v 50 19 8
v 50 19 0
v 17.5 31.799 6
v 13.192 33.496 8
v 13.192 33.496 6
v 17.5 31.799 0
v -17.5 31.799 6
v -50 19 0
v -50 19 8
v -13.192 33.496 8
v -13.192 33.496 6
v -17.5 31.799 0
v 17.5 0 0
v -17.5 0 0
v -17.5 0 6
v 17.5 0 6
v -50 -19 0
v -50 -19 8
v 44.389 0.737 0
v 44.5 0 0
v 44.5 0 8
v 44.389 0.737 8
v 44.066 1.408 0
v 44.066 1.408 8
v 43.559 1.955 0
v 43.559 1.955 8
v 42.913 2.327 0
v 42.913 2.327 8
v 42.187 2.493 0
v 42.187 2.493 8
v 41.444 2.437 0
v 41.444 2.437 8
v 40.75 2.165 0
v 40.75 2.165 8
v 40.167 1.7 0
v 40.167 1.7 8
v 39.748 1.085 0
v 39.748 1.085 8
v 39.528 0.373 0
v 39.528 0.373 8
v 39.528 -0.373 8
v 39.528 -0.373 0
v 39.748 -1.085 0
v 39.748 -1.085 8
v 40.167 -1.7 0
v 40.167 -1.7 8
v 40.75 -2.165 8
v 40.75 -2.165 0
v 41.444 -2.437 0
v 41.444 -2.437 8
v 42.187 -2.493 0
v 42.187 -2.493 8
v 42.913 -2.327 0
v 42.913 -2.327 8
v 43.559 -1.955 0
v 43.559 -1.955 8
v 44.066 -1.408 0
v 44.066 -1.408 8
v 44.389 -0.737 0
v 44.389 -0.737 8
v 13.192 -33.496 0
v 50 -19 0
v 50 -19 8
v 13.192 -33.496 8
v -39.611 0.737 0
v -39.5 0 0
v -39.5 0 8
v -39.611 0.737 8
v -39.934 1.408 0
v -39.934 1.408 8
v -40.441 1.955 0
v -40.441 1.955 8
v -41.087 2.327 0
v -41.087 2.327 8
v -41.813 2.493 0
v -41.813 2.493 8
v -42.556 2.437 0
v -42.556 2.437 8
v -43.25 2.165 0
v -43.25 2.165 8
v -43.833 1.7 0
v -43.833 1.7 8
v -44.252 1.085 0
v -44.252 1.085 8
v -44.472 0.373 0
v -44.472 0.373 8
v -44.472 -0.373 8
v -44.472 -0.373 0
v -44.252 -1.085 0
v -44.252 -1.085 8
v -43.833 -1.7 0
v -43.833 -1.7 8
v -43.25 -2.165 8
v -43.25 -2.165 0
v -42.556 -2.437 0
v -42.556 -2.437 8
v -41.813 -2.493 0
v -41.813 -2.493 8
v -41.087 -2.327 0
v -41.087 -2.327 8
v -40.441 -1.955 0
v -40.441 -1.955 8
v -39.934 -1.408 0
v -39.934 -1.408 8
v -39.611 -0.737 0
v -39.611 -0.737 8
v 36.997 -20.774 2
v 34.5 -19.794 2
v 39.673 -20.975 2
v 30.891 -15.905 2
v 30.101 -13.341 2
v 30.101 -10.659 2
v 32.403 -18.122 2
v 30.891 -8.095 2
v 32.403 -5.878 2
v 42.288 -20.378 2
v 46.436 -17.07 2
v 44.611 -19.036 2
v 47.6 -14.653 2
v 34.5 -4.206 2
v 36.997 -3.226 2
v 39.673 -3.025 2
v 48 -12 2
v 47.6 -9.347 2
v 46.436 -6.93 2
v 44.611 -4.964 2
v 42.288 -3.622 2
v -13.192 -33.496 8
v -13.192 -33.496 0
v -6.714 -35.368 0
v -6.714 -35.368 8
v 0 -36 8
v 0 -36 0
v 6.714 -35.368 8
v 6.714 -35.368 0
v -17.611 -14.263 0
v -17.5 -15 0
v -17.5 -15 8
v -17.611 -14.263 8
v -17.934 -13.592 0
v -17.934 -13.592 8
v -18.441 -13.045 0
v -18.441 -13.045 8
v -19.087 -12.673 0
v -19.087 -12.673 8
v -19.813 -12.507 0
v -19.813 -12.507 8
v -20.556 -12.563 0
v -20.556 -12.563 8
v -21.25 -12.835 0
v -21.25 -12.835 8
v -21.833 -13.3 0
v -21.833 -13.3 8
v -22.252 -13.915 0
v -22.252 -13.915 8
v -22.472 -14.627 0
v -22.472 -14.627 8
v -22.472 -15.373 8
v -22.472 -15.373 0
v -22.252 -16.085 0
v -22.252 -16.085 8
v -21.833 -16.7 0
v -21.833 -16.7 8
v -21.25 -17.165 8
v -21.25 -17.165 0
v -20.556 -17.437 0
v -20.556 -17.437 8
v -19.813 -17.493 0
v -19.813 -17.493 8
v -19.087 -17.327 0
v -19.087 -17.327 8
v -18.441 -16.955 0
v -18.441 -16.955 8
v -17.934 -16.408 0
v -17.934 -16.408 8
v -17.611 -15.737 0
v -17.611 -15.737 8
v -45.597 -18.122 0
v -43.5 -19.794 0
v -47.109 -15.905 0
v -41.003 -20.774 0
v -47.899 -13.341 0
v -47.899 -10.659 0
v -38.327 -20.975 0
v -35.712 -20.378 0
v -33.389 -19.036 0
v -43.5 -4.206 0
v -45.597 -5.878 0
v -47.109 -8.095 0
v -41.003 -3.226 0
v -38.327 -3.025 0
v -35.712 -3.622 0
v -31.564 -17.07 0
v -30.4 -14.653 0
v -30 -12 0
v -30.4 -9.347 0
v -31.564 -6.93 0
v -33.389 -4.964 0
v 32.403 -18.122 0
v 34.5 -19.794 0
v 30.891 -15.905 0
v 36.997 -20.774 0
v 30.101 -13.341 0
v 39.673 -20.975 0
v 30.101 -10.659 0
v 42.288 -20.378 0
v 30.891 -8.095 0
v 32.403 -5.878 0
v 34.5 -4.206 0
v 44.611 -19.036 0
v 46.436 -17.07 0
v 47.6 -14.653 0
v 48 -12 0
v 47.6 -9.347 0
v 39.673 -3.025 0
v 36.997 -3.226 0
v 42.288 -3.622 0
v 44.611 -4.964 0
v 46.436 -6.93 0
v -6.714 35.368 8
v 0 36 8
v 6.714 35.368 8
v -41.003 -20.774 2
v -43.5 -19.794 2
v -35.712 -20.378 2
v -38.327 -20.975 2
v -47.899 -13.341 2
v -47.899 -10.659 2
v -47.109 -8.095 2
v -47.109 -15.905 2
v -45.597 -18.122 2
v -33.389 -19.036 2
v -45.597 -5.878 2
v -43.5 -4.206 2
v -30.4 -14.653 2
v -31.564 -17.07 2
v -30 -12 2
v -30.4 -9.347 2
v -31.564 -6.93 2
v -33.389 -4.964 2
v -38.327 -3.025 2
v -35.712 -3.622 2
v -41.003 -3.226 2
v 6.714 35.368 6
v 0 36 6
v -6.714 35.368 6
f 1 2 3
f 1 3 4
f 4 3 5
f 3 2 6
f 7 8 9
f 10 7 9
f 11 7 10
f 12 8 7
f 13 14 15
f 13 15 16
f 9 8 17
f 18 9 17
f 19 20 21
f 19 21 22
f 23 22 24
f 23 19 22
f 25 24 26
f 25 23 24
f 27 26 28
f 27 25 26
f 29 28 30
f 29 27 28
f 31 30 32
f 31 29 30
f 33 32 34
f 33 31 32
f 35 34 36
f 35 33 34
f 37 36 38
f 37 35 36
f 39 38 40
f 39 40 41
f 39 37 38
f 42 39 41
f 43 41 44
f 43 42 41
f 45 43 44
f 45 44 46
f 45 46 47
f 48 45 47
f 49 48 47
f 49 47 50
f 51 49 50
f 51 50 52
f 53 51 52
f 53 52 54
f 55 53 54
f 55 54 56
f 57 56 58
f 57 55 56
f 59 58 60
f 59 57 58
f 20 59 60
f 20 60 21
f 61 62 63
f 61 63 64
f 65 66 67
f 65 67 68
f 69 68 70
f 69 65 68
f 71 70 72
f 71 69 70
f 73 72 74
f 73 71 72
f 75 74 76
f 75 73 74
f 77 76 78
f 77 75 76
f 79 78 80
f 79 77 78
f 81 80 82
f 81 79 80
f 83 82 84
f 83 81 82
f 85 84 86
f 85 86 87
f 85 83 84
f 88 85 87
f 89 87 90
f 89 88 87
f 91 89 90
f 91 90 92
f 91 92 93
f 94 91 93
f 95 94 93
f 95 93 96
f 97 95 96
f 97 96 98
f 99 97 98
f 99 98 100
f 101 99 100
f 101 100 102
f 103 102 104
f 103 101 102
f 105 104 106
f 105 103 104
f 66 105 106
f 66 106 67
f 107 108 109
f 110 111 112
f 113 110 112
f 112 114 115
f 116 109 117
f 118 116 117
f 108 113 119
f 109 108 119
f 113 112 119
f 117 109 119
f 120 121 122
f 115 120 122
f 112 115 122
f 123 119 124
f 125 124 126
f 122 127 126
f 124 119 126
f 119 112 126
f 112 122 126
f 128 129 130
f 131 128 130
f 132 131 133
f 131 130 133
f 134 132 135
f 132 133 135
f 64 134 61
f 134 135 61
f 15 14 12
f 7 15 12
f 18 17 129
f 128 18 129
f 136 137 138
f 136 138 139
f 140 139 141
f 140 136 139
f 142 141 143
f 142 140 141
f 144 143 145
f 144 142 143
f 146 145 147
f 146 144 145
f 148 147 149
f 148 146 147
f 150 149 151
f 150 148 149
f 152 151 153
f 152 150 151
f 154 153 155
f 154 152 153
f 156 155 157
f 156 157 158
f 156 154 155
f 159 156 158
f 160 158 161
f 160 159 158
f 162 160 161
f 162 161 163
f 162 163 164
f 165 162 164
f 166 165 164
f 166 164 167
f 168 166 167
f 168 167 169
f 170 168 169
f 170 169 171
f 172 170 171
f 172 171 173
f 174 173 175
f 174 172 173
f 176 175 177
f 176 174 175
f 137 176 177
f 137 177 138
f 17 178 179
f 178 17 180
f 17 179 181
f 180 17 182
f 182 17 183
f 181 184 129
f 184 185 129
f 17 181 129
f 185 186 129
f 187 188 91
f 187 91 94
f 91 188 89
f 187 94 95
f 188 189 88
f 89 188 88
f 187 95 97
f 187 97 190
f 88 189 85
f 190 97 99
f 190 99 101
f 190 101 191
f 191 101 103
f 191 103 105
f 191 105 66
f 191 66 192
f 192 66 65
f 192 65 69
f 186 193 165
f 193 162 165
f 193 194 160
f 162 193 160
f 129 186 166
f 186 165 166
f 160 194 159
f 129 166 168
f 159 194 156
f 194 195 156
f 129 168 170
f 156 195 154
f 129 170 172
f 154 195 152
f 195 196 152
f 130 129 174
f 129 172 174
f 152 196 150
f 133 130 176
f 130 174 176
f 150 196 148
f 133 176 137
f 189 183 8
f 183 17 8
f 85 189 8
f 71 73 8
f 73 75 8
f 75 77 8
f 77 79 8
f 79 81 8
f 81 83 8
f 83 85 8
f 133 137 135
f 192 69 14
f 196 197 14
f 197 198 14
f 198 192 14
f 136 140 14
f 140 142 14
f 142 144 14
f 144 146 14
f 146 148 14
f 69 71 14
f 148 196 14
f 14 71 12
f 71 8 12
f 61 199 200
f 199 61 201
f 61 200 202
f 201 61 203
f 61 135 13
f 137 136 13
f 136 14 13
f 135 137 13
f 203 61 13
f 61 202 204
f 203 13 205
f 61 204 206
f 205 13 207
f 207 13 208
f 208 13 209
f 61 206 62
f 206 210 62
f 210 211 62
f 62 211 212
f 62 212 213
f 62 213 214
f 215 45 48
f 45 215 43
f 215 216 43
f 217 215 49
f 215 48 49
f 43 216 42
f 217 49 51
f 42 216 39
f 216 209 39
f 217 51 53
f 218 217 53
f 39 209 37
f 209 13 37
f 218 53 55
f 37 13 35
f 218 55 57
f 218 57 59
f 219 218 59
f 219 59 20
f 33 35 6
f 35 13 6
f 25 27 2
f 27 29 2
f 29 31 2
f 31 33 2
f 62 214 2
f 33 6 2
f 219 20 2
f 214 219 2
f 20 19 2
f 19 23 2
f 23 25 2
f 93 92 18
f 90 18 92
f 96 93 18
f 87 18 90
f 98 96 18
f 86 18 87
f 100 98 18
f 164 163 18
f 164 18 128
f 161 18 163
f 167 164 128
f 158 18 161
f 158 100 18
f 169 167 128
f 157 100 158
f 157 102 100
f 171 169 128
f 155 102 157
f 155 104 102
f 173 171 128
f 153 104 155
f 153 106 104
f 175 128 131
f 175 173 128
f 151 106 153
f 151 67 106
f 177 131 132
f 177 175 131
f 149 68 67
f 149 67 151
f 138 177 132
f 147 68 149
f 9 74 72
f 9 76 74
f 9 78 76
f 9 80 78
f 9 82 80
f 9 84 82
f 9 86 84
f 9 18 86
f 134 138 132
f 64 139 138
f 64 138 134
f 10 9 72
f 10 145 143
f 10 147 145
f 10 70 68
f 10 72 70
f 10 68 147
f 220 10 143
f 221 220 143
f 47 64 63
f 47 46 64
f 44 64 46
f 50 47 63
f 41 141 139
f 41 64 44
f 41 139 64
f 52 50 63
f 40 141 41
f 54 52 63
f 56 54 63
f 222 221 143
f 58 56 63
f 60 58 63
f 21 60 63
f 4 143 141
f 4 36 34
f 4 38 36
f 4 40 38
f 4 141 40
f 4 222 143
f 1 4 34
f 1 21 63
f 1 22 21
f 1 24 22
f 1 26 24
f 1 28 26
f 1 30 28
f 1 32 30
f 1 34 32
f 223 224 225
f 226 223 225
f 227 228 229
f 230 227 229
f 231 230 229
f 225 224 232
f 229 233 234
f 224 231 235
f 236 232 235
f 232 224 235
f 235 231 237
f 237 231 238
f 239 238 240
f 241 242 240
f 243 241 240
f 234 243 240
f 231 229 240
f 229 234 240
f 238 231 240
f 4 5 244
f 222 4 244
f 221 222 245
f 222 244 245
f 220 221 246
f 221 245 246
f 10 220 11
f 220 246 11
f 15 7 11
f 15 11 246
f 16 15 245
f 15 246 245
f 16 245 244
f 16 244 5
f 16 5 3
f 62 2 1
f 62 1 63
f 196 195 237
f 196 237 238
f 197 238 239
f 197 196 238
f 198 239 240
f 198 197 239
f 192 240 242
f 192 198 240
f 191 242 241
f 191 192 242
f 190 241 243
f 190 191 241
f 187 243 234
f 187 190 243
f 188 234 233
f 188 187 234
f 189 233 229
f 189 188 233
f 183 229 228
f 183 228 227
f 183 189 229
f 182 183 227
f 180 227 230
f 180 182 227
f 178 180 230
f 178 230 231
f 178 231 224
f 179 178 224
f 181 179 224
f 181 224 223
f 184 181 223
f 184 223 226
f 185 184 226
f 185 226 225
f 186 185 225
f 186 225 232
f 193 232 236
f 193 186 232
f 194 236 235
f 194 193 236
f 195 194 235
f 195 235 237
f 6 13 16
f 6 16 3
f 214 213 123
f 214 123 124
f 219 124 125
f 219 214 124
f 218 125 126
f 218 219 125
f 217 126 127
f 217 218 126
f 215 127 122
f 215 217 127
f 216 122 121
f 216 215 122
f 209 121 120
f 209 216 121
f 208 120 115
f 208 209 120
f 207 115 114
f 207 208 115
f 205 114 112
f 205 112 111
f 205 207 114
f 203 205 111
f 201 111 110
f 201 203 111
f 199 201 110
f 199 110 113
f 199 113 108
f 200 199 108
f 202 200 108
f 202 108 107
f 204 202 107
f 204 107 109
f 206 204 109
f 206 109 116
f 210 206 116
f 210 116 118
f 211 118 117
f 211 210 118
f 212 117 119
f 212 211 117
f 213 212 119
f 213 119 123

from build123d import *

# Parameters (mm, degrees)
SKETCH002_R      = 9
EXTRUDE002_DEPTH = 2
SKETCH001_W      = 35
SKETCH001_H      = 40
EXTRUDE001_DEPTH = 6
SKETCH_R         = 2.5
EXTRUDE_DEPTH    = 8


with BuildPart() as extrude002:
    # Sketch002 (on Sketch) → Extrude002 (new body)
    with BuildSketch(Plane.XY):
        with Locations((-39, -12)):
            Circle(SKETCH002_R)
        with Locations((39, -12)):
            Circle(SKETCH002_R)
    extrude(amount=EXTRUDE002_DEPTH)


with BuildPart() as extrude_handle_notch:
    # Sketch001 → Extrude001 (new body)
    with BuildSketch(Plane.XY):
        with Locations((0, 20)):
            Rectangle(SKETCH001_W, SKETCH001_H)
    extrude(amount=EXTRUDE001_DEPTH)


with BuildPart() as cut001:
    # Sketch → Extrude (new body)
    with BuildSketch(Plane.XY):
        with BuildLine():
            Line((-50, 19), (-50, -19))
            Line((-50, -19), (-13.191508, -33.496031))
            ThreePointArc((-13.191508, -33.496031), (0, -36), (13.191508, -33.496031))
            Line((50, -19), (13.191508, -33.496031))
            Line((50, 19), (50, -19))
            Line((50, 19), (13.191508, 33.496031))
            ThreePointArc((13.191508, 33.496031), (0, 36), (-13.191508, 33.496031))
            Line((-50, 19), (-13.191508, 33.496031))
        make_face()
        with Locations((-42, 0)):
            Circle(SKETCH_R, mode=Mode.SUBTRACT)
        with Locations((42, 0)):
            Circle(SKETCH_R, mode=Mode.SUBTRACT)
        with Locations((-20, -15)):
            Circle(SKETCH_R, mode=Mode.SUBTRACT)
    extrude(amount=EXTRUDE_DEPTH)

    # Cut: cut Extrude Handle Notch
    add(extrude_handle_notch.part, mode=Mode.SUBTRACT)

    # Cut001: cut Extrude002
    add(extrude002.part, mode=Mode.SUBTRACT)


solid = cut001.part
